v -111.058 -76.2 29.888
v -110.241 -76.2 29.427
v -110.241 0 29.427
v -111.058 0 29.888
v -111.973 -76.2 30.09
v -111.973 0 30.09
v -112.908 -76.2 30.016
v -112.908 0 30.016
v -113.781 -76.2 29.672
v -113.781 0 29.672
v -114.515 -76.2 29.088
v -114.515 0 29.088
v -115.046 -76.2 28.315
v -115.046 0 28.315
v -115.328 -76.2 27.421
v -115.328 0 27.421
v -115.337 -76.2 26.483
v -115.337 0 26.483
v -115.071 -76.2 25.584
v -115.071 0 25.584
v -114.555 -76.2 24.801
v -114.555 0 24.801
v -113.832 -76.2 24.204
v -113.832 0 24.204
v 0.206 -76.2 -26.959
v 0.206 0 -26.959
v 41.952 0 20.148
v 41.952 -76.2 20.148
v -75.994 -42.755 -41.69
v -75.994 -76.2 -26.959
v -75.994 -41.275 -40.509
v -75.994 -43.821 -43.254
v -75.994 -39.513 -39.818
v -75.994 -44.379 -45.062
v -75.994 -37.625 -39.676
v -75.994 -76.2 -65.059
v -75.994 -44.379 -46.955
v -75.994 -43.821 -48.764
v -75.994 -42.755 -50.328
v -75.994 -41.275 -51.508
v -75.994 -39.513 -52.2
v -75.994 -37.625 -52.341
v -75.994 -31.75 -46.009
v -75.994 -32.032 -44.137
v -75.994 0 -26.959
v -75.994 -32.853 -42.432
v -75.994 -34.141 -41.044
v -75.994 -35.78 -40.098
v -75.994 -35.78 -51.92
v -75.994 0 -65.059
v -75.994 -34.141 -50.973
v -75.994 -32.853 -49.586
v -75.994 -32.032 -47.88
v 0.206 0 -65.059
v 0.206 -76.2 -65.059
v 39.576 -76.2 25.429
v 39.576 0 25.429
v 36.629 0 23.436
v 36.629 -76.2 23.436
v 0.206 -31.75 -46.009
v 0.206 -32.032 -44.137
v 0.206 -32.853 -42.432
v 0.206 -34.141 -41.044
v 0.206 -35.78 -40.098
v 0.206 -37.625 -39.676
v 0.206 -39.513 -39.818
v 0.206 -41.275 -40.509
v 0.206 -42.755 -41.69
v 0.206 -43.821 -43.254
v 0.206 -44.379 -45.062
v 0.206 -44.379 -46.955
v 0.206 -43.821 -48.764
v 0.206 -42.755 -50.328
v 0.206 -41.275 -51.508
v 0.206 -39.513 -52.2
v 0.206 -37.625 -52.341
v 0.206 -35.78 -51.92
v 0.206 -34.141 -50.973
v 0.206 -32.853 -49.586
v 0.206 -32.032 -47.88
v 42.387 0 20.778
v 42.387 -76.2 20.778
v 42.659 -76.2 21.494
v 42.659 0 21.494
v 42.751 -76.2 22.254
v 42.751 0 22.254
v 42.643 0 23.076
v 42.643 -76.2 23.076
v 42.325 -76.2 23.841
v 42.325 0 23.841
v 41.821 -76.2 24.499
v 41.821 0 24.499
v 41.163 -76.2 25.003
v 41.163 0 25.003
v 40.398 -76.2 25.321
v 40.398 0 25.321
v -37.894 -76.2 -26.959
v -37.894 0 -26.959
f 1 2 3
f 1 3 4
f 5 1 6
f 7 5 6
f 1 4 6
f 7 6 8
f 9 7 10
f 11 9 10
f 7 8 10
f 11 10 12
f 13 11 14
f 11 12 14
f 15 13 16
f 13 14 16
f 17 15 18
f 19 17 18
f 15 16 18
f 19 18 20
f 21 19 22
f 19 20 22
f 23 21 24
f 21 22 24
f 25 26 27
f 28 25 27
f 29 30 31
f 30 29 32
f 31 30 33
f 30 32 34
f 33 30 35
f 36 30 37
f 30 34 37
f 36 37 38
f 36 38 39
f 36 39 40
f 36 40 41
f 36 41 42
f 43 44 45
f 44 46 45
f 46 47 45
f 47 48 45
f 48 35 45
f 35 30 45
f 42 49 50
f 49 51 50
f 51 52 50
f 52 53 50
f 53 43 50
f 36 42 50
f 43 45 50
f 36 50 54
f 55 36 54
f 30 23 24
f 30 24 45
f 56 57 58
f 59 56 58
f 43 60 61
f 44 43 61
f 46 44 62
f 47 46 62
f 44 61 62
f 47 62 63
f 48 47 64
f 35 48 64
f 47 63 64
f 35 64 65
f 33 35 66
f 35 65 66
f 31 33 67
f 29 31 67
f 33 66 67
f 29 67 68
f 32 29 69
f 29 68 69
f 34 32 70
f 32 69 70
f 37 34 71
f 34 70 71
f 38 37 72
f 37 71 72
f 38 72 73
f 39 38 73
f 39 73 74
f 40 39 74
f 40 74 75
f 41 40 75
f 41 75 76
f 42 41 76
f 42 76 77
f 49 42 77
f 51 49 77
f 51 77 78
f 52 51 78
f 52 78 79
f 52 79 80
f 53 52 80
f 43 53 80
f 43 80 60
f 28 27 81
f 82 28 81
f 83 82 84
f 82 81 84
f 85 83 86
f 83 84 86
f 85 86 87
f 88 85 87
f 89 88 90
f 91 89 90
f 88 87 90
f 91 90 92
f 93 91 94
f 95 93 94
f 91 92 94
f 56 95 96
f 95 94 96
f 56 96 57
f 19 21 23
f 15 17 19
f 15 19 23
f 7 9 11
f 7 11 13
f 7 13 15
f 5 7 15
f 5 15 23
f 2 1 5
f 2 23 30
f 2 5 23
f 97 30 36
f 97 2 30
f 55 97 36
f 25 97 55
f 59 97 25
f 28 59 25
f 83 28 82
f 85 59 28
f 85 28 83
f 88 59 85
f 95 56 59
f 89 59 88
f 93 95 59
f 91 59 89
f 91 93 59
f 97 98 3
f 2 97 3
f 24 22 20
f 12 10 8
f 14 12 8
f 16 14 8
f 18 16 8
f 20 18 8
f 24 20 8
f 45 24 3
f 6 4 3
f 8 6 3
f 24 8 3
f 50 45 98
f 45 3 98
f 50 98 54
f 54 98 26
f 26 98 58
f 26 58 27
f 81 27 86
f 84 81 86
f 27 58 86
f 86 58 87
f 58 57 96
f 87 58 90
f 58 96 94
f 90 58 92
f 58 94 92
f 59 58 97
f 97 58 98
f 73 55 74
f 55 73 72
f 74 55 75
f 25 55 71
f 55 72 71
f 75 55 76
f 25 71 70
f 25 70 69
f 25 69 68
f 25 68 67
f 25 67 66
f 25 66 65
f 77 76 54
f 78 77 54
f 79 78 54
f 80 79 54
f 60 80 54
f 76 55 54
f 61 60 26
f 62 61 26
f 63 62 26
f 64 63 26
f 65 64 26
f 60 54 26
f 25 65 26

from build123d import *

# Parameters (mm, degrees)
F1_DEPTH = 76.2
F2_DEPTH = 211.582
F3_R     = 6.35
F4_DEPTH = 296.926


with BuildPart() as f1:
    # F0 (on Front) → F1 (new body)
    with BuildSketch(Plane.XZ):
        with BuildLine():
            Line((-75.994186, -26.958708), (-75.994186, -65.058708))
            Line((-75.994186, -65.058708), (0.205814, -65.058708))
            Line((0.205814, -65.058708), (0.205814, -26.958708))
            Line((0.205814, -26.958708), (41.952003, 20.148002))
            ThreePointArc((41.952003, 20.148002), (37.907157, 19.552642), (36.629202, 23.436206))
            Line((36.629202, 23.436206), (-37.894186, -26.958708))
            Line((-37.894186, -26.958708), (-110.240799, 29.427088))
            ThreePointArc((-110.240799, 29.427088), (-109.339718, 28.31636), (-109.017566, 26.922845))
            ThreePointArc((-109.017566, 26.922845), (-110.631205, 24.158288), (-113.831913, 24.203807))
            Line((-113.831913, 24.203807), (-75.994186, -26.958708))
        make_face()
        with BuildLine():
            ThreePointArc((36.629202, 23.436206), (37.907157, 19.552642), (41.952003, 20.148002))
            ThreePointArc((41.952003, 20.148002), (42.544402, 21.127687), (42.750814, 22.253792))
            ThreePointArc((42.750814, 22.253792), (41.820878, 24.498856), (39.575814, 25.428792))
            Line((39.575814, 25.428792), (36.629202, 23.436206))
        make_face()
        with BuildLine():
            ThreePointArc((-110.240799, 29.427088), (-114.808874, 28.721611), (-113.831913, 24.203807))
            ThreePointArc((-113.831913, 24.203807), (-110.631205, 24.158288), (-109.017566, 26.922845))
            ThreePointArc((-109.017566, 26.922845), (-109.339718, 28.31636), (-110.240799, 29.427088))
        make_face()
    extrude(amount=F1_DEPTH)

    # F1_face (on face) → F2 (cut)
    with BuildSketch(Plane(origin=(-38.414118, 0, -27.709483), x_dir=(1, 0, 0), z_dir=(0, 1, 0))):
        with BuildLine():
            Line((-37.580068, 37.349226), (-37.580068, -0.750774))
            Line((-37.580068, -0.750774), (-75.417795, -51.91329))
            ThreePointArc((-75.417795, -51.91329), (-76.394756, -56.431093), (-71.826681, -57.13657))
            Line((-71.826681, -57.13657), (0.519932, -0.750774))
            Line((0.519932, -0.750774), (77.989932, -53.138274))
            ThreePointArc((77.989932, -53.138274), (80.234996, -52.208338), (81.164932, -49.963274))
            ThreePointArc((81.164932, -49.963274), (80.958519, -48.837169), (80.366121, -47.857484))
            Line((80.366121, -47.857484), (38.619932, -0.750774))
            Line((38.619932, -0.750774), (38.619932, 37.349226))
            Line((38.619932, 37.349226), (-37.580068, 37.349226))
        make_face()
    extrude(amount=F2_DEPTH, mode=Mode.SUBTRACT)

    # F3 (on face) → F4 (cut)
    with BuildSketch(Plane.YZ.offset(0.205814)):
        with Locations((-38.1, -46.008708)):
            Circle(F3_R)
    extrude(amount=-F4_DEPTH, mode=Mode.SUBTRACT)


solid = f1.part
